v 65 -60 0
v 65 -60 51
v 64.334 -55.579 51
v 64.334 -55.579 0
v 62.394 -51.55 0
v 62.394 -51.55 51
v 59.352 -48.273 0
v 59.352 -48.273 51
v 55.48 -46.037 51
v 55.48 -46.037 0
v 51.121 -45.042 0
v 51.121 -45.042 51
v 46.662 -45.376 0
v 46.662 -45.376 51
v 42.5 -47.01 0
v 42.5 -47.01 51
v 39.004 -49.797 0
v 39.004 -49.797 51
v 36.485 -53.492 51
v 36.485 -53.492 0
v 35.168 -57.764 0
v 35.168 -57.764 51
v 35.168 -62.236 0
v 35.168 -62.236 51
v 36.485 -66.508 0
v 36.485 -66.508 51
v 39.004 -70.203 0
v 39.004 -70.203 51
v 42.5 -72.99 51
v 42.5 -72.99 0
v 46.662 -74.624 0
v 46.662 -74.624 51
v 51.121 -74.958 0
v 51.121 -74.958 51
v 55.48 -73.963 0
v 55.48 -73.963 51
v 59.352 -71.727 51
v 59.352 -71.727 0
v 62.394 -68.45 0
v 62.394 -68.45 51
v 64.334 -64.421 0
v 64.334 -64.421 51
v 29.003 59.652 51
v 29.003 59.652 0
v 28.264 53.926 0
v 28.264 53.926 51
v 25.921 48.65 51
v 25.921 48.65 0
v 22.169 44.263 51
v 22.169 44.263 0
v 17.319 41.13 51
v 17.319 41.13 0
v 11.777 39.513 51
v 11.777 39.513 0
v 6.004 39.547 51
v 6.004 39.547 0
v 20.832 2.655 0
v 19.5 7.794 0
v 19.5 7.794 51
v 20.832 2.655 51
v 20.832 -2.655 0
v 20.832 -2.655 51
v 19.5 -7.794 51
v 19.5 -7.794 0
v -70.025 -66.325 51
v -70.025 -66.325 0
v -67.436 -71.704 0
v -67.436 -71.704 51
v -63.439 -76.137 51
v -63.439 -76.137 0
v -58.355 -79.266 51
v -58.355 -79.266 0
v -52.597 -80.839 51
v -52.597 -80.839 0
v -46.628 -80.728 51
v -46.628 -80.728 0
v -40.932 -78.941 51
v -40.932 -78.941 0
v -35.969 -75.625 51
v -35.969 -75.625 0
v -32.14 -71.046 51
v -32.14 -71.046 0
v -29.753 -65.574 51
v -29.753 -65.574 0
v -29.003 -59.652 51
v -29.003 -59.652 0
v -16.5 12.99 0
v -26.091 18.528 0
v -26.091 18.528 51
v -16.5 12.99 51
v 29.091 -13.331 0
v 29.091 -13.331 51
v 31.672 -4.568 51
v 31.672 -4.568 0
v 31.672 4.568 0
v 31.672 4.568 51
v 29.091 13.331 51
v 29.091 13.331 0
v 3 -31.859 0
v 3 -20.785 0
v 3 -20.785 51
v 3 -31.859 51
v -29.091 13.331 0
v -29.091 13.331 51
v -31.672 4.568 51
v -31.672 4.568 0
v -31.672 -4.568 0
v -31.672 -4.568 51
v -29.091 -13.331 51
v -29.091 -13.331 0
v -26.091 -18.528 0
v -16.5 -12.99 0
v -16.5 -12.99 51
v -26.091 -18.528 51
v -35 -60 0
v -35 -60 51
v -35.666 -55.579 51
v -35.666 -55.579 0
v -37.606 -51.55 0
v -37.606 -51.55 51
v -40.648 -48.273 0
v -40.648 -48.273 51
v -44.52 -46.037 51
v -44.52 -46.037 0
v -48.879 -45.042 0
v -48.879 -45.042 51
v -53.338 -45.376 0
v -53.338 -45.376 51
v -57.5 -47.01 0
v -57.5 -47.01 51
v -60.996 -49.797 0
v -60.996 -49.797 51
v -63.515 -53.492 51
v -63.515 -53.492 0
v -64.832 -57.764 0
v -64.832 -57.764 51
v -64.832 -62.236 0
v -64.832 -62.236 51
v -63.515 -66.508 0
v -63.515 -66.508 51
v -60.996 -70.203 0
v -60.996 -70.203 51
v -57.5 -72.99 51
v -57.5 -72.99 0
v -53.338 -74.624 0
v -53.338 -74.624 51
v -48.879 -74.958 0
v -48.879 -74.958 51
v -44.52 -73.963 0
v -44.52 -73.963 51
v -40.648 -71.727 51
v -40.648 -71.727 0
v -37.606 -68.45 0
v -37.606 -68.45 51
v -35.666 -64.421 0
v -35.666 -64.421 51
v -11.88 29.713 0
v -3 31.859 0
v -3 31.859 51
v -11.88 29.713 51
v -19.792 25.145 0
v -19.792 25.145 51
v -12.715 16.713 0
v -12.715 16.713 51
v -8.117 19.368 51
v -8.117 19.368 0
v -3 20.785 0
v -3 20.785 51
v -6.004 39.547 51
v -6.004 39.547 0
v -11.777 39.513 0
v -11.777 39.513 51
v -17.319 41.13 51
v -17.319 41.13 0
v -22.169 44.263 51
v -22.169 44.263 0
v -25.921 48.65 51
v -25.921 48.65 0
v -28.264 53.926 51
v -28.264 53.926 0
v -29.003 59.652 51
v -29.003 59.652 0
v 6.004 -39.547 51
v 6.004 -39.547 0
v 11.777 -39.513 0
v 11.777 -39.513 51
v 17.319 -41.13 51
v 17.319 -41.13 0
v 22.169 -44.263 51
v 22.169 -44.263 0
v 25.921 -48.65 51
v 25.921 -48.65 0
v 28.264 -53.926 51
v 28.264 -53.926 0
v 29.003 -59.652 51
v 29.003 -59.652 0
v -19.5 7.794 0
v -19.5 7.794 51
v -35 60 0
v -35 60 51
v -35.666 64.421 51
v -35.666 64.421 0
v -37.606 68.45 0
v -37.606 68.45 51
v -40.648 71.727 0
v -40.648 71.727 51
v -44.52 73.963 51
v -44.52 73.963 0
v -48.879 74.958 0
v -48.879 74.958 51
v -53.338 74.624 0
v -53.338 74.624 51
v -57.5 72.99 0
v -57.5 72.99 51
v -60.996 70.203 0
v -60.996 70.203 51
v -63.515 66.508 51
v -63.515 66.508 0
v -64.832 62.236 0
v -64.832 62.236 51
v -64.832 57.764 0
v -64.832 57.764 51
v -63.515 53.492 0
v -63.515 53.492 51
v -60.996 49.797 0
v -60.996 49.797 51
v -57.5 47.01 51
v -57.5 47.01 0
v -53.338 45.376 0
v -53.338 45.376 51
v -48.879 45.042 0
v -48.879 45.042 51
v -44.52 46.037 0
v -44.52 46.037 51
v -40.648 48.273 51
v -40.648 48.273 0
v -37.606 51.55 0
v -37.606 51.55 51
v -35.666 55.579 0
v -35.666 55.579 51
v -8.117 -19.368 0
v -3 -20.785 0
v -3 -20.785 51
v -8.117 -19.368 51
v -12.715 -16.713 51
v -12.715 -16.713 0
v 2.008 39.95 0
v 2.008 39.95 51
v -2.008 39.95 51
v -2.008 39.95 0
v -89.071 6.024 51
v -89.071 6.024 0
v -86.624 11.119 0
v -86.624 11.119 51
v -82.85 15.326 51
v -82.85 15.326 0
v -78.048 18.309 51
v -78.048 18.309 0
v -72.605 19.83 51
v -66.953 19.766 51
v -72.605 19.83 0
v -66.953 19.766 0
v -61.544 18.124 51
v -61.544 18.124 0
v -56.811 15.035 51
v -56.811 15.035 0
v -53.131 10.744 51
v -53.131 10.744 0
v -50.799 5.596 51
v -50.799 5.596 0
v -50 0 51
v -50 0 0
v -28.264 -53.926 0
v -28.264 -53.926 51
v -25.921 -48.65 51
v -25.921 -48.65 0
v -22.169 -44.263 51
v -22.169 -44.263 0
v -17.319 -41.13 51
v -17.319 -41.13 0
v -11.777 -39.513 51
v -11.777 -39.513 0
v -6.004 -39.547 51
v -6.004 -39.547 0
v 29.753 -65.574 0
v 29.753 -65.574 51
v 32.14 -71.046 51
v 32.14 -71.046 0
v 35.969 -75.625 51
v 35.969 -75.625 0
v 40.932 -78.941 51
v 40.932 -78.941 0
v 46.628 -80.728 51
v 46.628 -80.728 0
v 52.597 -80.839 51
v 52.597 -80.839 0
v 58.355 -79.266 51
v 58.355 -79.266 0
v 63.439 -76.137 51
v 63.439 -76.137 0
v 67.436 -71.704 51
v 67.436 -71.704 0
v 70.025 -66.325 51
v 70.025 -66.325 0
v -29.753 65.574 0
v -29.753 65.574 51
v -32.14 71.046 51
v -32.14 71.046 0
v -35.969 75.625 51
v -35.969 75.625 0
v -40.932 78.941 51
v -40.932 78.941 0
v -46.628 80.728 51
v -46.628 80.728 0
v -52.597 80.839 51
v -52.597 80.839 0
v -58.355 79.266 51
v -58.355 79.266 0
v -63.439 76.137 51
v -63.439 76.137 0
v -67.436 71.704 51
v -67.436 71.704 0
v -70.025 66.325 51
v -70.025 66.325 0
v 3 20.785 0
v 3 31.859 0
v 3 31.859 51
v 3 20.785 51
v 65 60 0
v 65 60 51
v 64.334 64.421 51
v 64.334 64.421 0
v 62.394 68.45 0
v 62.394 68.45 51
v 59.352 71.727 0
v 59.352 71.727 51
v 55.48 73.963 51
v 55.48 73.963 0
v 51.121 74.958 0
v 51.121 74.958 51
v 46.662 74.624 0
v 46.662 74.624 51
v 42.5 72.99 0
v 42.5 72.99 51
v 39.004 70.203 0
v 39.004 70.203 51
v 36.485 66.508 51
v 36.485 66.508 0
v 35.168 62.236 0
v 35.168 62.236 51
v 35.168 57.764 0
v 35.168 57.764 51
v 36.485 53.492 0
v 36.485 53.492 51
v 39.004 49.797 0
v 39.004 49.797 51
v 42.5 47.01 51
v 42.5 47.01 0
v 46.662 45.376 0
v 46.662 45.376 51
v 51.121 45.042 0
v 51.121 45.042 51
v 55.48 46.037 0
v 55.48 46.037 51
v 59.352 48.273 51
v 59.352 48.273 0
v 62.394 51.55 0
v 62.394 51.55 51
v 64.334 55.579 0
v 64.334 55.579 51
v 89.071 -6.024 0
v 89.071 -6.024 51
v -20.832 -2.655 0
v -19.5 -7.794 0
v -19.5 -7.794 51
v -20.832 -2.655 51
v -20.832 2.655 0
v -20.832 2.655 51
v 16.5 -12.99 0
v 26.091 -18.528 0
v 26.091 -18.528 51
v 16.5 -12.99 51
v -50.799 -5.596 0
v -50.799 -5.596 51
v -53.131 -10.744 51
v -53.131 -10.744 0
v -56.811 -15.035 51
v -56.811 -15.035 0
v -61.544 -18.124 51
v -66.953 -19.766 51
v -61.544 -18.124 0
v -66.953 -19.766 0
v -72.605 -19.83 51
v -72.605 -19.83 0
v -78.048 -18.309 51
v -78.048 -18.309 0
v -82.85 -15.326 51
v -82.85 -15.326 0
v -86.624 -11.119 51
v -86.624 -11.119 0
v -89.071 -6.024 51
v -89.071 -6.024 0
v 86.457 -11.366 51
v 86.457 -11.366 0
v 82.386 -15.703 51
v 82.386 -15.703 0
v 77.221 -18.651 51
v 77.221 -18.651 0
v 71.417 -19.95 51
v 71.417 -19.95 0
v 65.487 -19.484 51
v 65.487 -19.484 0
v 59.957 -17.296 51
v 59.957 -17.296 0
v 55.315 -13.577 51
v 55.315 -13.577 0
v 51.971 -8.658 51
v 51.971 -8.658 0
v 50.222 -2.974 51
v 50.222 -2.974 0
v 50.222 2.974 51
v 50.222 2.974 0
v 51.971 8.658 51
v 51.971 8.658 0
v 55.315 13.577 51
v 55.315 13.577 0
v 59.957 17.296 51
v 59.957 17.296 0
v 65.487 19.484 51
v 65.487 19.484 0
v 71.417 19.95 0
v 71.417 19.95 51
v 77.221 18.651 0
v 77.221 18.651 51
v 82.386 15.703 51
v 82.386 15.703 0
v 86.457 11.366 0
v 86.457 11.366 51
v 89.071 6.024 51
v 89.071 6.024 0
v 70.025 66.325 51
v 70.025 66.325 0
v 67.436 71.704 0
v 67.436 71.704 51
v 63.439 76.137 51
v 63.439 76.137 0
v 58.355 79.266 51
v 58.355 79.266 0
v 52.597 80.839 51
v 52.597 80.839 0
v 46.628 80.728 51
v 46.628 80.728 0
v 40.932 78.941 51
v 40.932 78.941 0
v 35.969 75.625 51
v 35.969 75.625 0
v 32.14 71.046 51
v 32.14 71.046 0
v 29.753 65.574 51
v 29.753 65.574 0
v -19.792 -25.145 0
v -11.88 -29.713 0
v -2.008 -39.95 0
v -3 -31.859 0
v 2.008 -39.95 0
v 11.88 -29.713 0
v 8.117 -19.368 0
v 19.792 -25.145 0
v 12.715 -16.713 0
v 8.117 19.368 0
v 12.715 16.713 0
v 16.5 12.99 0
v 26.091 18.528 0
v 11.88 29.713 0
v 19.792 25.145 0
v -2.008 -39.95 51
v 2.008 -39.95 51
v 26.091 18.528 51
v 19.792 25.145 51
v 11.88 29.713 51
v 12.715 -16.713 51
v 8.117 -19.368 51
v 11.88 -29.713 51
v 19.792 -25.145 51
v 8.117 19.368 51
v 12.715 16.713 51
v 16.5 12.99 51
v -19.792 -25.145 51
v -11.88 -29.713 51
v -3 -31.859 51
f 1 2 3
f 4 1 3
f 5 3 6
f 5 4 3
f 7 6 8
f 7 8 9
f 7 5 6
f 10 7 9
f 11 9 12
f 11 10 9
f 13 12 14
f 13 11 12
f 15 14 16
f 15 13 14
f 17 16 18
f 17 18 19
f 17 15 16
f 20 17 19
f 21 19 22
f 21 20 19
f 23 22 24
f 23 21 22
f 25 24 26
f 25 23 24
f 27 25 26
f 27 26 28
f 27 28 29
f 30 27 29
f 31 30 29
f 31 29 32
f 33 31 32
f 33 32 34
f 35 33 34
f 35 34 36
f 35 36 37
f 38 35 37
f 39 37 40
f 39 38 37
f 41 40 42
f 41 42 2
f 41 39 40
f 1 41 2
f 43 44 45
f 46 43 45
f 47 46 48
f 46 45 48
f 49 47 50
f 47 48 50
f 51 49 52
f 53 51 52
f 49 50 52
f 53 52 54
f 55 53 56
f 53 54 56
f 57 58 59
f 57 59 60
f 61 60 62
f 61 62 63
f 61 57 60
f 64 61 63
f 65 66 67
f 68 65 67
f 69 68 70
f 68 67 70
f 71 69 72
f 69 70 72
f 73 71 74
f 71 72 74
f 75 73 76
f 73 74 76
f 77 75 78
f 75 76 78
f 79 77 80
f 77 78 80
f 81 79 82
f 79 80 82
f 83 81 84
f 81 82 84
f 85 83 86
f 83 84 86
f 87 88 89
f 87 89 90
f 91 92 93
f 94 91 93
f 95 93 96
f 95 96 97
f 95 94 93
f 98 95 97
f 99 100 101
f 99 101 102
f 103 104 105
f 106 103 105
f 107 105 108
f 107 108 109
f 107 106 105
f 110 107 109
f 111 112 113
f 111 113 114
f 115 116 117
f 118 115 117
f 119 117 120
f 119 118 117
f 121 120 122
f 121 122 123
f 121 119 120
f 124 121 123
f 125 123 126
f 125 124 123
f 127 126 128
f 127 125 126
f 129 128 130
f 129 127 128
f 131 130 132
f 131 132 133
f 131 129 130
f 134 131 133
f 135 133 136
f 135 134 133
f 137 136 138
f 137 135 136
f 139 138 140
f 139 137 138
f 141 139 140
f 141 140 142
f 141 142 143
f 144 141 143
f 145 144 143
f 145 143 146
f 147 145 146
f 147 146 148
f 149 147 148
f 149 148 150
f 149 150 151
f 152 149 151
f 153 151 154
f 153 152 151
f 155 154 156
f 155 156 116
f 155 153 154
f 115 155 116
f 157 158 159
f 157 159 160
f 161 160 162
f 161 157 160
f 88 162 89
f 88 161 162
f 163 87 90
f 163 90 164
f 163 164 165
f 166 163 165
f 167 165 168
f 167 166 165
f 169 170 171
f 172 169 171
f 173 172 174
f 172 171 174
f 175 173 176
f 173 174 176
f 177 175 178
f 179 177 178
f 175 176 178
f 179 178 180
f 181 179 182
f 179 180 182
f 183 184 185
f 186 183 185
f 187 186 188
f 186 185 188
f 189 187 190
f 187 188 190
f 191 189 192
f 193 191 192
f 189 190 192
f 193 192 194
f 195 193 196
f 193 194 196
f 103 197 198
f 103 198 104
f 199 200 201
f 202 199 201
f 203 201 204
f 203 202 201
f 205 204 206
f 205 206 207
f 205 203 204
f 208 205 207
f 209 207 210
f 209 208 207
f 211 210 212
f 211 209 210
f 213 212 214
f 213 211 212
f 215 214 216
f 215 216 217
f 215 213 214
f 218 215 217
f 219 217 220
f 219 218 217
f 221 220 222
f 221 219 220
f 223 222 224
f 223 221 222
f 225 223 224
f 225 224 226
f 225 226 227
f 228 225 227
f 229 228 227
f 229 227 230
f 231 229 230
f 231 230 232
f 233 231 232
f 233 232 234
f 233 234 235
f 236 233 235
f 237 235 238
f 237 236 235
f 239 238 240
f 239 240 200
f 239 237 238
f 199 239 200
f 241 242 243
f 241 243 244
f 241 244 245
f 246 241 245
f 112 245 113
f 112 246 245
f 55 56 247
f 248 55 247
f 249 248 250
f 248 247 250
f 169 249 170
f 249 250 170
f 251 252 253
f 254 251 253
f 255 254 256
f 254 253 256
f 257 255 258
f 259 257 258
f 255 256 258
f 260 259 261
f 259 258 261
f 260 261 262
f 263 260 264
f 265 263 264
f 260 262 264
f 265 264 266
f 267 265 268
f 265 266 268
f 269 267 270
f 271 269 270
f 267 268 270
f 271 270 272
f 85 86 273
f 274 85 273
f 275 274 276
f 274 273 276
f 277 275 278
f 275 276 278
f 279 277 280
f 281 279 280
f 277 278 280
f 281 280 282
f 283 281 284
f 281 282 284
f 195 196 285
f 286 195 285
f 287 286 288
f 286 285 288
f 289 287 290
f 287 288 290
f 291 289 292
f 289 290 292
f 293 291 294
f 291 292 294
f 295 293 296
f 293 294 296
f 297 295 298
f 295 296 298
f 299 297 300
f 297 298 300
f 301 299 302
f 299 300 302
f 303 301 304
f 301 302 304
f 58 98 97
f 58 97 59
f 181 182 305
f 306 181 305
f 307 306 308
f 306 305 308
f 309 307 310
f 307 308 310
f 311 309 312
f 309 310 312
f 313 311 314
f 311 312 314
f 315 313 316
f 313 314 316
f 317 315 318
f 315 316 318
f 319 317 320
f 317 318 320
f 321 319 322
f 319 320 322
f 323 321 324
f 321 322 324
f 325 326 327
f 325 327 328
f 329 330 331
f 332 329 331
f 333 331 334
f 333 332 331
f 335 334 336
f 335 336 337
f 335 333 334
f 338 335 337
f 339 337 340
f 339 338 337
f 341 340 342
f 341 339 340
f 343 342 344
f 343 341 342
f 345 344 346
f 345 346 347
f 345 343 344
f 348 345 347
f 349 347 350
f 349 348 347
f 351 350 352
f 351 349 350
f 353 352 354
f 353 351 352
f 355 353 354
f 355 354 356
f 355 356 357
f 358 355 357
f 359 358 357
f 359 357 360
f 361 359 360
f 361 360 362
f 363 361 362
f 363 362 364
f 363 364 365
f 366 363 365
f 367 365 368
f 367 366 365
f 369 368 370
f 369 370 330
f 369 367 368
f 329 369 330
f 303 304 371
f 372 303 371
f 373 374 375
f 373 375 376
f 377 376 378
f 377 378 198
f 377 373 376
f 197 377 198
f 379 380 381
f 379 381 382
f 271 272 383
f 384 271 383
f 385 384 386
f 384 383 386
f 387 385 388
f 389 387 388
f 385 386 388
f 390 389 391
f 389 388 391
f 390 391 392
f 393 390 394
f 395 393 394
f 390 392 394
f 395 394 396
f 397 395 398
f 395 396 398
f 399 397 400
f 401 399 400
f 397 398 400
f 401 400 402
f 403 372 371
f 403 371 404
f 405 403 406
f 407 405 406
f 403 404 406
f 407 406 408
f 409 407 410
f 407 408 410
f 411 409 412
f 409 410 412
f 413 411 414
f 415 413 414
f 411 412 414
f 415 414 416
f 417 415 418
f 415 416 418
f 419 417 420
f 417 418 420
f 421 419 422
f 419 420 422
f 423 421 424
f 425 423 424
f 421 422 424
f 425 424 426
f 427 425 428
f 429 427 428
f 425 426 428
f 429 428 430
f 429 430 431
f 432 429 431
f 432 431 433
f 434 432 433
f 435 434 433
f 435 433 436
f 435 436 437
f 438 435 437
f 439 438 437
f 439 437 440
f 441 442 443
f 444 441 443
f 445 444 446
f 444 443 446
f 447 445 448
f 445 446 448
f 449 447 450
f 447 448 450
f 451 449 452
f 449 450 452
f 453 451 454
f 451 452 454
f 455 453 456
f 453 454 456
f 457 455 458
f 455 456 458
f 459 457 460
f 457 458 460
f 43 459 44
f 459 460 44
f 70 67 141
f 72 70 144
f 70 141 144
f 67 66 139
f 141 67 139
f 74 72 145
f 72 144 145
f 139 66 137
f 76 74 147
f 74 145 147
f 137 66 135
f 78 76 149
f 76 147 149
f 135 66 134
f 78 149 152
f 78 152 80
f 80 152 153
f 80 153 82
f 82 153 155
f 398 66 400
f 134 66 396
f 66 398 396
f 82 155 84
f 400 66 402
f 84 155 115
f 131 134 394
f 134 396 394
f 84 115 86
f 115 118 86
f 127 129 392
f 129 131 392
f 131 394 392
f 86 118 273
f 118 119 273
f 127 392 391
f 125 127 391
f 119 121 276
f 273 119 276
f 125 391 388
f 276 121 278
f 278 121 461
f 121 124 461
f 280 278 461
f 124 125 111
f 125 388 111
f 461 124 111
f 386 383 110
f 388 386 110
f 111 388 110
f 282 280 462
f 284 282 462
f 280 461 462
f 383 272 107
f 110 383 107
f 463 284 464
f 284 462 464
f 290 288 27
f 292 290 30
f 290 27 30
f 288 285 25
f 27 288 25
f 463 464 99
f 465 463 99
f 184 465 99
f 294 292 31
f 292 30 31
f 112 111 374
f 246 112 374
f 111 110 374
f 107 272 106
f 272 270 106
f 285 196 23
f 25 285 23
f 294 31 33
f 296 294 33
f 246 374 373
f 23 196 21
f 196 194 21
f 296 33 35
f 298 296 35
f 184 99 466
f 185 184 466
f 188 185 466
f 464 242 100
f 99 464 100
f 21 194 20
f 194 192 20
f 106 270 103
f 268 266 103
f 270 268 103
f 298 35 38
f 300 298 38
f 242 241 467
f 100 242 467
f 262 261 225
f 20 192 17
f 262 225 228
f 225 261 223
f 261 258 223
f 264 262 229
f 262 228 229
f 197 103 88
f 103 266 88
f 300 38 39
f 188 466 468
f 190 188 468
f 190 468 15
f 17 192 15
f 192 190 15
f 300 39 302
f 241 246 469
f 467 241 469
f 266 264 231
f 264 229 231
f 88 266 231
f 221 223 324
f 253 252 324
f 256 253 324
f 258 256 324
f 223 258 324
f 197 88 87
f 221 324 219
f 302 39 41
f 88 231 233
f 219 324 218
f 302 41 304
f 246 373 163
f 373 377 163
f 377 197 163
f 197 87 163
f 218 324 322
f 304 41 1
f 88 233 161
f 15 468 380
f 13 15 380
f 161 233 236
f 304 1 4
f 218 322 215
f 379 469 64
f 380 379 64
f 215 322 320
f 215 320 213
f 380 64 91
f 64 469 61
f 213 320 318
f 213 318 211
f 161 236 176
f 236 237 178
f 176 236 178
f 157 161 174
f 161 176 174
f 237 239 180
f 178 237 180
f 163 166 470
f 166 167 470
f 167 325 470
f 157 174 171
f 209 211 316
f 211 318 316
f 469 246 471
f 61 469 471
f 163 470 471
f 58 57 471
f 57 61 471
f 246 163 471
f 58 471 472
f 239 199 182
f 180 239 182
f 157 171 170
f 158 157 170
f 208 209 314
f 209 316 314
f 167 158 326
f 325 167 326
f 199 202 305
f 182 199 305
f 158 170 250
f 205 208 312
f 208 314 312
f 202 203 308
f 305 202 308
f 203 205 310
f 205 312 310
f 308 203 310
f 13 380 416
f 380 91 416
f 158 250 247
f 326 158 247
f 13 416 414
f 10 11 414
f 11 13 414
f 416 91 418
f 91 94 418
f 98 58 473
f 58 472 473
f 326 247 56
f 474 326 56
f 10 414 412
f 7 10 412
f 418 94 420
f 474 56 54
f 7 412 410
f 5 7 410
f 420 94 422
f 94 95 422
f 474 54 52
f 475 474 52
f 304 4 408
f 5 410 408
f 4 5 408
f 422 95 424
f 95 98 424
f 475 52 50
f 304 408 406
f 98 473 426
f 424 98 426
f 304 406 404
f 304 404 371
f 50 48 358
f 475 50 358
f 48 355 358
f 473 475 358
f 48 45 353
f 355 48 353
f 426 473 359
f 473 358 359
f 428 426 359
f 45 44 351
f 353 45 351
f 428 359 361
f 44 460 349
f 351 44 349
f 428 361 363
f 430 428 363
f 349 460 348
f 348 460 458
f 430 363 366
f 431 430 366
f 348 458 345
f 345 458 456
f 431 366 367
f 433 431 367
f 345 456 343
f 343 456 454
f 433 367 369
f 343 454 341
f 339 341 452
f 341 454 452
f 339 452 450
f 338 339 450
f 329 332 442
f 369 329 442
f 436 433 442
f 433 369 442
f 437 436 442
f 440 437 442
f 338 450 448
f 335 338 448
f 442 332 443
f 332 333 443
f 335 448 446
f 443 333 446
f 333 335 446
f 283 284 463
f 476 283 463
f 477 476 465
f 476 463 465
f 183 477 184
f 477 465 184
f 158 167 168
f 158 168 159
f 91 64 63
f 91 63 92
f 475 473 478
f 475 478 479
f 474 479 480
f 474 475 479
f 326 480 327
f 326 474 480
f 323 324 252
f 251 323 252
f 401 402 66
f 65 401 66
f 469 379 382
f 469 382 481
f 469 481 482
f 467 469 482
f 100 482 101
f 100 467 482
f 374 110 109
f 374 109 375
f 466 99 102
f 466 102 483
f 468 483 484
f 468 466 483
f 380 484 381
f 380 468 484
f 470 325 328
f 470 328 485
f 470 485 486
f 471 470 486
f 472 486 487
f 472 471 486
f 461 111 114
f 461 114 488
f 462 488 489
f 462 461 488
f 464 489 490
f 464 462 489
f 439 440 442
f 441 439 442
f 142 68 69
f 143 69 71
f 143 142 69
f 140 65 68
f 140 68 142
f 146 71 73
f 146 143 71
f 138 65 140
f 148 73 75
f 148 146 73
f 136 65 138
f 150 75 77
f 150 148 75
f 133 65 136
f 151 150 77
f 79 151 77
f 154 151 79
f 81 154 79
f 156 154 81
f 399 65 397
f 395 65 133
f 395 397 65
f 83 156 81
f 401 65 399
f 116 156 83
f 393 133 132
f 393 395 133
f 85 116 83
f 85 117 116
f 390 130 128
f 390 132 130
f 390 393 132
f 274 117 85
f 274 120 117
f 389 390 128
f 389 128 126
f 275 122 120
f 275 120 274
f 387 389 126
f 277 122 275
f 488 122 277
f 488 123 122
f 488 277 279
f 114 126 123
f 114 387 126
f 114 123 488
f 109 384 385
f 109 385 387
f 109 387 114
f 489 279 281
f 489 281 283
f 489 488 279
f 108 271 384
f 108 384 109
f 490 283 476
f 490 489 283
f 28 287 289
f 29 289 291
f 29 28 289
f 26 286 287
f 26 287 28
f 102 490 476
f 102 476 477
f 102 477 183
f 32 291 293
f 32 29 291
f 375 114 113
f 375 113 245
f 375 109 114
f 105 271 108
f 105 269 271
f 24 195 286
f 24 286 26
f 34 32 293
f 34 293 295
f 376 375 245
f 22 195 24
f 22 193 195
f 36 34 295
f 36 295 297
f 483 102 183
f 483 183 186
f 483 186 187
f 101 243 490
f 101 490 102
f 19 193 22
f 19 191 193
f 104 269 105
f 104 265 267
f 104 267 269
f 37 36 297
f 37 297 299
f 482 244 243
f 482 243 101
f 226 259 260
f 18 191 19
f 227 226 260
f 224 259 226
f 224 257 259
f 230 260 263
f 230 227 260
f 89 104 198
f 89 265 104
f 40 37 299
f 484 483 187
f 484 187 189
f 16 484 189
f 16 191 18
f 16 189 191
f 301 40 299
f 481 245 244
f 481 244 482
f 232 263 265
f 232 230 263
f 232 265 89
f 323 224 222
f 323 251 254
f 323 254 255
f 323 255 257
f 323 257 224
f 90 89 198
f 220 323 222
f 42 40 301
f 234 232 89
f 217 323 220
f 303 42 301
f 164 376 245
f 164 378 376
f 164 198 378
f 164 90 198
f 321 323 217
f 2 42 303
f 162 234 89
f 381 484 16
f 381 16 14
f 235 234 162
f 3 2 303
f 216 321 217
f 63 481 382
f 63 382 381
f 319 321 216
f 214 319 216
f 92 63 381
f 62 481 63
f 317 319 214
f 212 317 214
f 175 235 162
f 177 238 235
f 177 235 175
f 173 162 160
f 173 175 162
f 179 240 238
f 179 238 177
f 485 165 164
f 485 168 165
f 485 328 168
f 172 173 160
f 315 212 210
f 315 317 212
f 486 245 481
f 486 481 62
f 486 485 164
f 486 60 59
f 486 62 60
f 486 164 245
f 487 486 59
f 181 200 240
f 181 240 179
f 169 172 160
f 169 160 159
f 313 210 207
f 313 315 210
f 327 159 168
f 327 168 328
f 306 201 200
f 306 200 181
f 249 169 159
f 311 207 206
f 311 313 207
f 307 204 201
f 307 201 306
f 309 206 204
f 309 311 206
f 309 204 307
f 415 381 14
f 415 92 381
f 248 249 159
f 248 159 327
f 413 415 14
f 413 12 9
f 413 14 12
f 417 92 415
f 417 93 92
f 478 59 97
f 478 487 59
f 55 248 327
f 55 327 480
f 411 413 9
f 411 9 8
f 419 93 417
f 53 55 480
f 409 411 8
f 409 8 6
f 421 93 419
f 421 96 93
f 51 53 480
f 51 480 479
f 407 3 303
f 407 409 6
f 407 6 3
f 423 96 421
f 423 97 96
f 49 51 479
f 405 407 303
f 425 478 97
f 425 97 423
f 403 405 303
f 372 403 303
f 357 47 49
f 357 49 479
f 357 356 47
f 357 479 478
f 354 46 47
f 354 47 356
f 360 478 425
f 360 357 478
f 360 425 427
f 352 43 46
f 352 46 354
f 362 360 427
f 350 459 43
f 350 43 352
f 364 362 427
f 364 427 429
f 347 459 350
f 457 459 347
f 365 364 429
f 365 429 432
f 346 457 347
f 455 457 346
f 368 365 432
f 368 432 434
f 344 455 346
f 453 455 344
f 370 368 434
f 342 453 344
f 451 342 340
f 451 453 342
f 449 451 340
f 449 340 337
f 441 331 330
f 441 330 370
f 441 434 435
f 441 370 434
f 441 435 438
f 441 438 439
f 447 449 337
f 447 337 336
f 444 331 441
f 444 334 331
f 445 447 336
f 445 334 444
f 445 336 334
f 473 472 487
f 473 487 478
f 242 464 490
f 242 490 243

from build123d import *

# Parameters (mm, degrees)
SKETCH1_R           = 15
SKETCH1_R_2         = 40
BOSS_EXTRUDE4_DEPTH = 51


with BuildPart() as part:
    # Sketch1 → Boss-Extrude4 (new body)
    # profile 1 of 3: a face of its own
    with BuildSketch(Plane.XY):
        with BuildLine():
            ThreePointArc((-29.002885891, 59.651863383), (-46.6282273, 80.727545655), (-70.02485881, 66.324952937))
            Line((-70.02485881, 66.324952937), (-89.071294105, 6.023764702))
            ThreePointArc((-89.071294105, 6.023764702), (-66.95253237, 19.766460003), (-50, 0))
            ThreePointArc((-50, 0), (-66.95253237, -19.766460003), (-89.071294105, -6.023764702))
            Line((-89.071294105, -6.023764702), (-70.02485881, -66.324952937))
            ThreePointArc((-70.02485881, -66.324952937), (-46.6282273, -80.727545655), (-29.002885891, -59.651863383))
            ThreePointArc((-29.002885891, -59.651863383), (-22.168588856, -44.262528341), (-6.003756239, -39.546869801))
            ThreePointArc((-6.003756239, -39.546869801), (-40, 0), (-6.003756239, 39.546869801))
            ThreePointArc((-6.003756239, 39.546869801), (-22.168588856, 44.262528341), (-29.002885891, 59.651863383))
        make_face()
        with Locations((-50, -60)):
            Circle(SKETCH1_R, mode=Mode.SUBTRACT)
        with Locations((-50, 60)):
            Circle(SKETCH1_R, mode=Mode.SUBTRACT)
    # profile 2 of 3: a face of its own
    with BuildSketch(Plane.XY):
        with BuildLine():
            ThreePointArc((29.002885891, 59.651863383), (22.168588856, 44.262528341), (6.003756239, 39.546869801))
            ThreePointArc((6.003756239, 39.546869801), (30.332740146, 26.075369129), (40, 0))
            ThreePointArc((40, 0), (30.332740146, -26.075369129), (6.003756239, -39.546869801))
            ThreePointArc((6.003756239, -39.546869801), (22.168588856, -44.262528341), (29.002885891, -59.651863383))
            ThreePointArc((29.002885891, -59.651863383), (46.6282273, -80.727545655), (70.02485881, -66.324952937))
            Line((70.02485881, -66.324952937), (89.071294105, -6.023764702))
            ThreePointArc((89.071294105, -6.023764702), (50, 0), (89.071294105, 6.023764702))
            Line((89.071294105, 6.023764702), (70.02485881, 66.324952937))
            ThreePointArc((70.02485881, 66.324952937), (46.6282273, 80.727545655), (29.002885891, 59.651863383))
        make_face()
        with Locations((50, -60)):
            Circle(SKETCH1_R, mode=Mode.SUBTRACT)
        with Locations((50, 60)):
            Circle(SKETCH1_R, mode=Mode.SUBTRACT)
    # profile 3 of 3: a face of its own
    with BuildSketch(Plane.XY):
        Circle(SKETCH1_R_2)
        with BuildLine():
            ThreePointArc((26.090759323, 18.527608533), (16, 27.712812921), (3, 31.859064644))
            Line((3, 31.859064644), (3, 20.784609691))
            ThreePointArc((3, 20.784609691), (10.5, 18.186533479), (16.5, 12.990381057))
            Line((16.5, 12.990381057), (26.090759323, 18.527608533))
        make_face(mode=Mode.SUBTRACT)
        with BuildLine():
            Line((3, -20.784609691), (3, -31.859064644))
            ThreePointArc((3, -31.859064644), (16, -27.712812921), (26.090759323, -18.527608533))
            Line((26.090759323, -18.527608533), (16.5, -12.990381057))
            ThreePointArc((16.5, -12.990381057), (10.5, -18.186533479), (3, -20.784609691))
        make_face(mode=Mode.SUBTRACT)
        with BuildLine():
            Line((19.5, -7.794228634), (29.090759323, -13.331456111))
            ThreePointArc((29.090759323, -13.331456111), (32, 0), (29.090759323, 13.331456111))
            Line((29.090759323, 13.331456111), (19.5, 7.794228634))
            ThreePointArc((19.5, 7.794228634), (21, 0), (19.5, -7.794228634))
        make_face(mode=Mode.SUBTRACT)
        with BuildLine():
            Line((-3, 20.784609691), (-3, 31.859064644))
            ThreePointArc((-3, 31.859064644), (-16, 27.712812921), (-26.090759323, 18.527608533))
            Line((-26.090759323, 18.527608533), (-16.5, 12.990381057))
            ThreePointArc((-16.5, 12.990381057), (-10.5, 18.186533479), (-3, 20.784609691))
        make_face(mode=Mode.SUBTRACT)
        with BuildLine():
            Line((-19.5, 7.794228634), (-29.090759323, 13.331456111))
            ThreePointArc((-29.090759323, 13.331456111), (-32, 0), (-29.090759323, -13.331456111))
            Line((-29.090759323, -13.331456111), (-19.5, -7.794228634))
            ThreePointArc((-19.5, -7.794228634), (-21, 0), (-19.5, 7.794228634))
        make_face(mode=Mode.SUBTRACT)
        with BuildLine():
            Line((-16.5, -12.990381057), (-26.090759323, -18.527608533))
            ThreePointArc((-26.090759323, -18.527608533), (-16, -27.712812921), (-3, -31.859064644))
            Line((-3, -31.859064644), (-3, -20.784609691))
            ThreePointArc((-3, -20.784609691), (-10.5, -18.186533479), (-16.5, -12.990381057))
        make_face(mode=Mode.SUBTRACT)
    extrude(amount=BOSS_EXTRUDE4_DEPTH)


solid = part.part
